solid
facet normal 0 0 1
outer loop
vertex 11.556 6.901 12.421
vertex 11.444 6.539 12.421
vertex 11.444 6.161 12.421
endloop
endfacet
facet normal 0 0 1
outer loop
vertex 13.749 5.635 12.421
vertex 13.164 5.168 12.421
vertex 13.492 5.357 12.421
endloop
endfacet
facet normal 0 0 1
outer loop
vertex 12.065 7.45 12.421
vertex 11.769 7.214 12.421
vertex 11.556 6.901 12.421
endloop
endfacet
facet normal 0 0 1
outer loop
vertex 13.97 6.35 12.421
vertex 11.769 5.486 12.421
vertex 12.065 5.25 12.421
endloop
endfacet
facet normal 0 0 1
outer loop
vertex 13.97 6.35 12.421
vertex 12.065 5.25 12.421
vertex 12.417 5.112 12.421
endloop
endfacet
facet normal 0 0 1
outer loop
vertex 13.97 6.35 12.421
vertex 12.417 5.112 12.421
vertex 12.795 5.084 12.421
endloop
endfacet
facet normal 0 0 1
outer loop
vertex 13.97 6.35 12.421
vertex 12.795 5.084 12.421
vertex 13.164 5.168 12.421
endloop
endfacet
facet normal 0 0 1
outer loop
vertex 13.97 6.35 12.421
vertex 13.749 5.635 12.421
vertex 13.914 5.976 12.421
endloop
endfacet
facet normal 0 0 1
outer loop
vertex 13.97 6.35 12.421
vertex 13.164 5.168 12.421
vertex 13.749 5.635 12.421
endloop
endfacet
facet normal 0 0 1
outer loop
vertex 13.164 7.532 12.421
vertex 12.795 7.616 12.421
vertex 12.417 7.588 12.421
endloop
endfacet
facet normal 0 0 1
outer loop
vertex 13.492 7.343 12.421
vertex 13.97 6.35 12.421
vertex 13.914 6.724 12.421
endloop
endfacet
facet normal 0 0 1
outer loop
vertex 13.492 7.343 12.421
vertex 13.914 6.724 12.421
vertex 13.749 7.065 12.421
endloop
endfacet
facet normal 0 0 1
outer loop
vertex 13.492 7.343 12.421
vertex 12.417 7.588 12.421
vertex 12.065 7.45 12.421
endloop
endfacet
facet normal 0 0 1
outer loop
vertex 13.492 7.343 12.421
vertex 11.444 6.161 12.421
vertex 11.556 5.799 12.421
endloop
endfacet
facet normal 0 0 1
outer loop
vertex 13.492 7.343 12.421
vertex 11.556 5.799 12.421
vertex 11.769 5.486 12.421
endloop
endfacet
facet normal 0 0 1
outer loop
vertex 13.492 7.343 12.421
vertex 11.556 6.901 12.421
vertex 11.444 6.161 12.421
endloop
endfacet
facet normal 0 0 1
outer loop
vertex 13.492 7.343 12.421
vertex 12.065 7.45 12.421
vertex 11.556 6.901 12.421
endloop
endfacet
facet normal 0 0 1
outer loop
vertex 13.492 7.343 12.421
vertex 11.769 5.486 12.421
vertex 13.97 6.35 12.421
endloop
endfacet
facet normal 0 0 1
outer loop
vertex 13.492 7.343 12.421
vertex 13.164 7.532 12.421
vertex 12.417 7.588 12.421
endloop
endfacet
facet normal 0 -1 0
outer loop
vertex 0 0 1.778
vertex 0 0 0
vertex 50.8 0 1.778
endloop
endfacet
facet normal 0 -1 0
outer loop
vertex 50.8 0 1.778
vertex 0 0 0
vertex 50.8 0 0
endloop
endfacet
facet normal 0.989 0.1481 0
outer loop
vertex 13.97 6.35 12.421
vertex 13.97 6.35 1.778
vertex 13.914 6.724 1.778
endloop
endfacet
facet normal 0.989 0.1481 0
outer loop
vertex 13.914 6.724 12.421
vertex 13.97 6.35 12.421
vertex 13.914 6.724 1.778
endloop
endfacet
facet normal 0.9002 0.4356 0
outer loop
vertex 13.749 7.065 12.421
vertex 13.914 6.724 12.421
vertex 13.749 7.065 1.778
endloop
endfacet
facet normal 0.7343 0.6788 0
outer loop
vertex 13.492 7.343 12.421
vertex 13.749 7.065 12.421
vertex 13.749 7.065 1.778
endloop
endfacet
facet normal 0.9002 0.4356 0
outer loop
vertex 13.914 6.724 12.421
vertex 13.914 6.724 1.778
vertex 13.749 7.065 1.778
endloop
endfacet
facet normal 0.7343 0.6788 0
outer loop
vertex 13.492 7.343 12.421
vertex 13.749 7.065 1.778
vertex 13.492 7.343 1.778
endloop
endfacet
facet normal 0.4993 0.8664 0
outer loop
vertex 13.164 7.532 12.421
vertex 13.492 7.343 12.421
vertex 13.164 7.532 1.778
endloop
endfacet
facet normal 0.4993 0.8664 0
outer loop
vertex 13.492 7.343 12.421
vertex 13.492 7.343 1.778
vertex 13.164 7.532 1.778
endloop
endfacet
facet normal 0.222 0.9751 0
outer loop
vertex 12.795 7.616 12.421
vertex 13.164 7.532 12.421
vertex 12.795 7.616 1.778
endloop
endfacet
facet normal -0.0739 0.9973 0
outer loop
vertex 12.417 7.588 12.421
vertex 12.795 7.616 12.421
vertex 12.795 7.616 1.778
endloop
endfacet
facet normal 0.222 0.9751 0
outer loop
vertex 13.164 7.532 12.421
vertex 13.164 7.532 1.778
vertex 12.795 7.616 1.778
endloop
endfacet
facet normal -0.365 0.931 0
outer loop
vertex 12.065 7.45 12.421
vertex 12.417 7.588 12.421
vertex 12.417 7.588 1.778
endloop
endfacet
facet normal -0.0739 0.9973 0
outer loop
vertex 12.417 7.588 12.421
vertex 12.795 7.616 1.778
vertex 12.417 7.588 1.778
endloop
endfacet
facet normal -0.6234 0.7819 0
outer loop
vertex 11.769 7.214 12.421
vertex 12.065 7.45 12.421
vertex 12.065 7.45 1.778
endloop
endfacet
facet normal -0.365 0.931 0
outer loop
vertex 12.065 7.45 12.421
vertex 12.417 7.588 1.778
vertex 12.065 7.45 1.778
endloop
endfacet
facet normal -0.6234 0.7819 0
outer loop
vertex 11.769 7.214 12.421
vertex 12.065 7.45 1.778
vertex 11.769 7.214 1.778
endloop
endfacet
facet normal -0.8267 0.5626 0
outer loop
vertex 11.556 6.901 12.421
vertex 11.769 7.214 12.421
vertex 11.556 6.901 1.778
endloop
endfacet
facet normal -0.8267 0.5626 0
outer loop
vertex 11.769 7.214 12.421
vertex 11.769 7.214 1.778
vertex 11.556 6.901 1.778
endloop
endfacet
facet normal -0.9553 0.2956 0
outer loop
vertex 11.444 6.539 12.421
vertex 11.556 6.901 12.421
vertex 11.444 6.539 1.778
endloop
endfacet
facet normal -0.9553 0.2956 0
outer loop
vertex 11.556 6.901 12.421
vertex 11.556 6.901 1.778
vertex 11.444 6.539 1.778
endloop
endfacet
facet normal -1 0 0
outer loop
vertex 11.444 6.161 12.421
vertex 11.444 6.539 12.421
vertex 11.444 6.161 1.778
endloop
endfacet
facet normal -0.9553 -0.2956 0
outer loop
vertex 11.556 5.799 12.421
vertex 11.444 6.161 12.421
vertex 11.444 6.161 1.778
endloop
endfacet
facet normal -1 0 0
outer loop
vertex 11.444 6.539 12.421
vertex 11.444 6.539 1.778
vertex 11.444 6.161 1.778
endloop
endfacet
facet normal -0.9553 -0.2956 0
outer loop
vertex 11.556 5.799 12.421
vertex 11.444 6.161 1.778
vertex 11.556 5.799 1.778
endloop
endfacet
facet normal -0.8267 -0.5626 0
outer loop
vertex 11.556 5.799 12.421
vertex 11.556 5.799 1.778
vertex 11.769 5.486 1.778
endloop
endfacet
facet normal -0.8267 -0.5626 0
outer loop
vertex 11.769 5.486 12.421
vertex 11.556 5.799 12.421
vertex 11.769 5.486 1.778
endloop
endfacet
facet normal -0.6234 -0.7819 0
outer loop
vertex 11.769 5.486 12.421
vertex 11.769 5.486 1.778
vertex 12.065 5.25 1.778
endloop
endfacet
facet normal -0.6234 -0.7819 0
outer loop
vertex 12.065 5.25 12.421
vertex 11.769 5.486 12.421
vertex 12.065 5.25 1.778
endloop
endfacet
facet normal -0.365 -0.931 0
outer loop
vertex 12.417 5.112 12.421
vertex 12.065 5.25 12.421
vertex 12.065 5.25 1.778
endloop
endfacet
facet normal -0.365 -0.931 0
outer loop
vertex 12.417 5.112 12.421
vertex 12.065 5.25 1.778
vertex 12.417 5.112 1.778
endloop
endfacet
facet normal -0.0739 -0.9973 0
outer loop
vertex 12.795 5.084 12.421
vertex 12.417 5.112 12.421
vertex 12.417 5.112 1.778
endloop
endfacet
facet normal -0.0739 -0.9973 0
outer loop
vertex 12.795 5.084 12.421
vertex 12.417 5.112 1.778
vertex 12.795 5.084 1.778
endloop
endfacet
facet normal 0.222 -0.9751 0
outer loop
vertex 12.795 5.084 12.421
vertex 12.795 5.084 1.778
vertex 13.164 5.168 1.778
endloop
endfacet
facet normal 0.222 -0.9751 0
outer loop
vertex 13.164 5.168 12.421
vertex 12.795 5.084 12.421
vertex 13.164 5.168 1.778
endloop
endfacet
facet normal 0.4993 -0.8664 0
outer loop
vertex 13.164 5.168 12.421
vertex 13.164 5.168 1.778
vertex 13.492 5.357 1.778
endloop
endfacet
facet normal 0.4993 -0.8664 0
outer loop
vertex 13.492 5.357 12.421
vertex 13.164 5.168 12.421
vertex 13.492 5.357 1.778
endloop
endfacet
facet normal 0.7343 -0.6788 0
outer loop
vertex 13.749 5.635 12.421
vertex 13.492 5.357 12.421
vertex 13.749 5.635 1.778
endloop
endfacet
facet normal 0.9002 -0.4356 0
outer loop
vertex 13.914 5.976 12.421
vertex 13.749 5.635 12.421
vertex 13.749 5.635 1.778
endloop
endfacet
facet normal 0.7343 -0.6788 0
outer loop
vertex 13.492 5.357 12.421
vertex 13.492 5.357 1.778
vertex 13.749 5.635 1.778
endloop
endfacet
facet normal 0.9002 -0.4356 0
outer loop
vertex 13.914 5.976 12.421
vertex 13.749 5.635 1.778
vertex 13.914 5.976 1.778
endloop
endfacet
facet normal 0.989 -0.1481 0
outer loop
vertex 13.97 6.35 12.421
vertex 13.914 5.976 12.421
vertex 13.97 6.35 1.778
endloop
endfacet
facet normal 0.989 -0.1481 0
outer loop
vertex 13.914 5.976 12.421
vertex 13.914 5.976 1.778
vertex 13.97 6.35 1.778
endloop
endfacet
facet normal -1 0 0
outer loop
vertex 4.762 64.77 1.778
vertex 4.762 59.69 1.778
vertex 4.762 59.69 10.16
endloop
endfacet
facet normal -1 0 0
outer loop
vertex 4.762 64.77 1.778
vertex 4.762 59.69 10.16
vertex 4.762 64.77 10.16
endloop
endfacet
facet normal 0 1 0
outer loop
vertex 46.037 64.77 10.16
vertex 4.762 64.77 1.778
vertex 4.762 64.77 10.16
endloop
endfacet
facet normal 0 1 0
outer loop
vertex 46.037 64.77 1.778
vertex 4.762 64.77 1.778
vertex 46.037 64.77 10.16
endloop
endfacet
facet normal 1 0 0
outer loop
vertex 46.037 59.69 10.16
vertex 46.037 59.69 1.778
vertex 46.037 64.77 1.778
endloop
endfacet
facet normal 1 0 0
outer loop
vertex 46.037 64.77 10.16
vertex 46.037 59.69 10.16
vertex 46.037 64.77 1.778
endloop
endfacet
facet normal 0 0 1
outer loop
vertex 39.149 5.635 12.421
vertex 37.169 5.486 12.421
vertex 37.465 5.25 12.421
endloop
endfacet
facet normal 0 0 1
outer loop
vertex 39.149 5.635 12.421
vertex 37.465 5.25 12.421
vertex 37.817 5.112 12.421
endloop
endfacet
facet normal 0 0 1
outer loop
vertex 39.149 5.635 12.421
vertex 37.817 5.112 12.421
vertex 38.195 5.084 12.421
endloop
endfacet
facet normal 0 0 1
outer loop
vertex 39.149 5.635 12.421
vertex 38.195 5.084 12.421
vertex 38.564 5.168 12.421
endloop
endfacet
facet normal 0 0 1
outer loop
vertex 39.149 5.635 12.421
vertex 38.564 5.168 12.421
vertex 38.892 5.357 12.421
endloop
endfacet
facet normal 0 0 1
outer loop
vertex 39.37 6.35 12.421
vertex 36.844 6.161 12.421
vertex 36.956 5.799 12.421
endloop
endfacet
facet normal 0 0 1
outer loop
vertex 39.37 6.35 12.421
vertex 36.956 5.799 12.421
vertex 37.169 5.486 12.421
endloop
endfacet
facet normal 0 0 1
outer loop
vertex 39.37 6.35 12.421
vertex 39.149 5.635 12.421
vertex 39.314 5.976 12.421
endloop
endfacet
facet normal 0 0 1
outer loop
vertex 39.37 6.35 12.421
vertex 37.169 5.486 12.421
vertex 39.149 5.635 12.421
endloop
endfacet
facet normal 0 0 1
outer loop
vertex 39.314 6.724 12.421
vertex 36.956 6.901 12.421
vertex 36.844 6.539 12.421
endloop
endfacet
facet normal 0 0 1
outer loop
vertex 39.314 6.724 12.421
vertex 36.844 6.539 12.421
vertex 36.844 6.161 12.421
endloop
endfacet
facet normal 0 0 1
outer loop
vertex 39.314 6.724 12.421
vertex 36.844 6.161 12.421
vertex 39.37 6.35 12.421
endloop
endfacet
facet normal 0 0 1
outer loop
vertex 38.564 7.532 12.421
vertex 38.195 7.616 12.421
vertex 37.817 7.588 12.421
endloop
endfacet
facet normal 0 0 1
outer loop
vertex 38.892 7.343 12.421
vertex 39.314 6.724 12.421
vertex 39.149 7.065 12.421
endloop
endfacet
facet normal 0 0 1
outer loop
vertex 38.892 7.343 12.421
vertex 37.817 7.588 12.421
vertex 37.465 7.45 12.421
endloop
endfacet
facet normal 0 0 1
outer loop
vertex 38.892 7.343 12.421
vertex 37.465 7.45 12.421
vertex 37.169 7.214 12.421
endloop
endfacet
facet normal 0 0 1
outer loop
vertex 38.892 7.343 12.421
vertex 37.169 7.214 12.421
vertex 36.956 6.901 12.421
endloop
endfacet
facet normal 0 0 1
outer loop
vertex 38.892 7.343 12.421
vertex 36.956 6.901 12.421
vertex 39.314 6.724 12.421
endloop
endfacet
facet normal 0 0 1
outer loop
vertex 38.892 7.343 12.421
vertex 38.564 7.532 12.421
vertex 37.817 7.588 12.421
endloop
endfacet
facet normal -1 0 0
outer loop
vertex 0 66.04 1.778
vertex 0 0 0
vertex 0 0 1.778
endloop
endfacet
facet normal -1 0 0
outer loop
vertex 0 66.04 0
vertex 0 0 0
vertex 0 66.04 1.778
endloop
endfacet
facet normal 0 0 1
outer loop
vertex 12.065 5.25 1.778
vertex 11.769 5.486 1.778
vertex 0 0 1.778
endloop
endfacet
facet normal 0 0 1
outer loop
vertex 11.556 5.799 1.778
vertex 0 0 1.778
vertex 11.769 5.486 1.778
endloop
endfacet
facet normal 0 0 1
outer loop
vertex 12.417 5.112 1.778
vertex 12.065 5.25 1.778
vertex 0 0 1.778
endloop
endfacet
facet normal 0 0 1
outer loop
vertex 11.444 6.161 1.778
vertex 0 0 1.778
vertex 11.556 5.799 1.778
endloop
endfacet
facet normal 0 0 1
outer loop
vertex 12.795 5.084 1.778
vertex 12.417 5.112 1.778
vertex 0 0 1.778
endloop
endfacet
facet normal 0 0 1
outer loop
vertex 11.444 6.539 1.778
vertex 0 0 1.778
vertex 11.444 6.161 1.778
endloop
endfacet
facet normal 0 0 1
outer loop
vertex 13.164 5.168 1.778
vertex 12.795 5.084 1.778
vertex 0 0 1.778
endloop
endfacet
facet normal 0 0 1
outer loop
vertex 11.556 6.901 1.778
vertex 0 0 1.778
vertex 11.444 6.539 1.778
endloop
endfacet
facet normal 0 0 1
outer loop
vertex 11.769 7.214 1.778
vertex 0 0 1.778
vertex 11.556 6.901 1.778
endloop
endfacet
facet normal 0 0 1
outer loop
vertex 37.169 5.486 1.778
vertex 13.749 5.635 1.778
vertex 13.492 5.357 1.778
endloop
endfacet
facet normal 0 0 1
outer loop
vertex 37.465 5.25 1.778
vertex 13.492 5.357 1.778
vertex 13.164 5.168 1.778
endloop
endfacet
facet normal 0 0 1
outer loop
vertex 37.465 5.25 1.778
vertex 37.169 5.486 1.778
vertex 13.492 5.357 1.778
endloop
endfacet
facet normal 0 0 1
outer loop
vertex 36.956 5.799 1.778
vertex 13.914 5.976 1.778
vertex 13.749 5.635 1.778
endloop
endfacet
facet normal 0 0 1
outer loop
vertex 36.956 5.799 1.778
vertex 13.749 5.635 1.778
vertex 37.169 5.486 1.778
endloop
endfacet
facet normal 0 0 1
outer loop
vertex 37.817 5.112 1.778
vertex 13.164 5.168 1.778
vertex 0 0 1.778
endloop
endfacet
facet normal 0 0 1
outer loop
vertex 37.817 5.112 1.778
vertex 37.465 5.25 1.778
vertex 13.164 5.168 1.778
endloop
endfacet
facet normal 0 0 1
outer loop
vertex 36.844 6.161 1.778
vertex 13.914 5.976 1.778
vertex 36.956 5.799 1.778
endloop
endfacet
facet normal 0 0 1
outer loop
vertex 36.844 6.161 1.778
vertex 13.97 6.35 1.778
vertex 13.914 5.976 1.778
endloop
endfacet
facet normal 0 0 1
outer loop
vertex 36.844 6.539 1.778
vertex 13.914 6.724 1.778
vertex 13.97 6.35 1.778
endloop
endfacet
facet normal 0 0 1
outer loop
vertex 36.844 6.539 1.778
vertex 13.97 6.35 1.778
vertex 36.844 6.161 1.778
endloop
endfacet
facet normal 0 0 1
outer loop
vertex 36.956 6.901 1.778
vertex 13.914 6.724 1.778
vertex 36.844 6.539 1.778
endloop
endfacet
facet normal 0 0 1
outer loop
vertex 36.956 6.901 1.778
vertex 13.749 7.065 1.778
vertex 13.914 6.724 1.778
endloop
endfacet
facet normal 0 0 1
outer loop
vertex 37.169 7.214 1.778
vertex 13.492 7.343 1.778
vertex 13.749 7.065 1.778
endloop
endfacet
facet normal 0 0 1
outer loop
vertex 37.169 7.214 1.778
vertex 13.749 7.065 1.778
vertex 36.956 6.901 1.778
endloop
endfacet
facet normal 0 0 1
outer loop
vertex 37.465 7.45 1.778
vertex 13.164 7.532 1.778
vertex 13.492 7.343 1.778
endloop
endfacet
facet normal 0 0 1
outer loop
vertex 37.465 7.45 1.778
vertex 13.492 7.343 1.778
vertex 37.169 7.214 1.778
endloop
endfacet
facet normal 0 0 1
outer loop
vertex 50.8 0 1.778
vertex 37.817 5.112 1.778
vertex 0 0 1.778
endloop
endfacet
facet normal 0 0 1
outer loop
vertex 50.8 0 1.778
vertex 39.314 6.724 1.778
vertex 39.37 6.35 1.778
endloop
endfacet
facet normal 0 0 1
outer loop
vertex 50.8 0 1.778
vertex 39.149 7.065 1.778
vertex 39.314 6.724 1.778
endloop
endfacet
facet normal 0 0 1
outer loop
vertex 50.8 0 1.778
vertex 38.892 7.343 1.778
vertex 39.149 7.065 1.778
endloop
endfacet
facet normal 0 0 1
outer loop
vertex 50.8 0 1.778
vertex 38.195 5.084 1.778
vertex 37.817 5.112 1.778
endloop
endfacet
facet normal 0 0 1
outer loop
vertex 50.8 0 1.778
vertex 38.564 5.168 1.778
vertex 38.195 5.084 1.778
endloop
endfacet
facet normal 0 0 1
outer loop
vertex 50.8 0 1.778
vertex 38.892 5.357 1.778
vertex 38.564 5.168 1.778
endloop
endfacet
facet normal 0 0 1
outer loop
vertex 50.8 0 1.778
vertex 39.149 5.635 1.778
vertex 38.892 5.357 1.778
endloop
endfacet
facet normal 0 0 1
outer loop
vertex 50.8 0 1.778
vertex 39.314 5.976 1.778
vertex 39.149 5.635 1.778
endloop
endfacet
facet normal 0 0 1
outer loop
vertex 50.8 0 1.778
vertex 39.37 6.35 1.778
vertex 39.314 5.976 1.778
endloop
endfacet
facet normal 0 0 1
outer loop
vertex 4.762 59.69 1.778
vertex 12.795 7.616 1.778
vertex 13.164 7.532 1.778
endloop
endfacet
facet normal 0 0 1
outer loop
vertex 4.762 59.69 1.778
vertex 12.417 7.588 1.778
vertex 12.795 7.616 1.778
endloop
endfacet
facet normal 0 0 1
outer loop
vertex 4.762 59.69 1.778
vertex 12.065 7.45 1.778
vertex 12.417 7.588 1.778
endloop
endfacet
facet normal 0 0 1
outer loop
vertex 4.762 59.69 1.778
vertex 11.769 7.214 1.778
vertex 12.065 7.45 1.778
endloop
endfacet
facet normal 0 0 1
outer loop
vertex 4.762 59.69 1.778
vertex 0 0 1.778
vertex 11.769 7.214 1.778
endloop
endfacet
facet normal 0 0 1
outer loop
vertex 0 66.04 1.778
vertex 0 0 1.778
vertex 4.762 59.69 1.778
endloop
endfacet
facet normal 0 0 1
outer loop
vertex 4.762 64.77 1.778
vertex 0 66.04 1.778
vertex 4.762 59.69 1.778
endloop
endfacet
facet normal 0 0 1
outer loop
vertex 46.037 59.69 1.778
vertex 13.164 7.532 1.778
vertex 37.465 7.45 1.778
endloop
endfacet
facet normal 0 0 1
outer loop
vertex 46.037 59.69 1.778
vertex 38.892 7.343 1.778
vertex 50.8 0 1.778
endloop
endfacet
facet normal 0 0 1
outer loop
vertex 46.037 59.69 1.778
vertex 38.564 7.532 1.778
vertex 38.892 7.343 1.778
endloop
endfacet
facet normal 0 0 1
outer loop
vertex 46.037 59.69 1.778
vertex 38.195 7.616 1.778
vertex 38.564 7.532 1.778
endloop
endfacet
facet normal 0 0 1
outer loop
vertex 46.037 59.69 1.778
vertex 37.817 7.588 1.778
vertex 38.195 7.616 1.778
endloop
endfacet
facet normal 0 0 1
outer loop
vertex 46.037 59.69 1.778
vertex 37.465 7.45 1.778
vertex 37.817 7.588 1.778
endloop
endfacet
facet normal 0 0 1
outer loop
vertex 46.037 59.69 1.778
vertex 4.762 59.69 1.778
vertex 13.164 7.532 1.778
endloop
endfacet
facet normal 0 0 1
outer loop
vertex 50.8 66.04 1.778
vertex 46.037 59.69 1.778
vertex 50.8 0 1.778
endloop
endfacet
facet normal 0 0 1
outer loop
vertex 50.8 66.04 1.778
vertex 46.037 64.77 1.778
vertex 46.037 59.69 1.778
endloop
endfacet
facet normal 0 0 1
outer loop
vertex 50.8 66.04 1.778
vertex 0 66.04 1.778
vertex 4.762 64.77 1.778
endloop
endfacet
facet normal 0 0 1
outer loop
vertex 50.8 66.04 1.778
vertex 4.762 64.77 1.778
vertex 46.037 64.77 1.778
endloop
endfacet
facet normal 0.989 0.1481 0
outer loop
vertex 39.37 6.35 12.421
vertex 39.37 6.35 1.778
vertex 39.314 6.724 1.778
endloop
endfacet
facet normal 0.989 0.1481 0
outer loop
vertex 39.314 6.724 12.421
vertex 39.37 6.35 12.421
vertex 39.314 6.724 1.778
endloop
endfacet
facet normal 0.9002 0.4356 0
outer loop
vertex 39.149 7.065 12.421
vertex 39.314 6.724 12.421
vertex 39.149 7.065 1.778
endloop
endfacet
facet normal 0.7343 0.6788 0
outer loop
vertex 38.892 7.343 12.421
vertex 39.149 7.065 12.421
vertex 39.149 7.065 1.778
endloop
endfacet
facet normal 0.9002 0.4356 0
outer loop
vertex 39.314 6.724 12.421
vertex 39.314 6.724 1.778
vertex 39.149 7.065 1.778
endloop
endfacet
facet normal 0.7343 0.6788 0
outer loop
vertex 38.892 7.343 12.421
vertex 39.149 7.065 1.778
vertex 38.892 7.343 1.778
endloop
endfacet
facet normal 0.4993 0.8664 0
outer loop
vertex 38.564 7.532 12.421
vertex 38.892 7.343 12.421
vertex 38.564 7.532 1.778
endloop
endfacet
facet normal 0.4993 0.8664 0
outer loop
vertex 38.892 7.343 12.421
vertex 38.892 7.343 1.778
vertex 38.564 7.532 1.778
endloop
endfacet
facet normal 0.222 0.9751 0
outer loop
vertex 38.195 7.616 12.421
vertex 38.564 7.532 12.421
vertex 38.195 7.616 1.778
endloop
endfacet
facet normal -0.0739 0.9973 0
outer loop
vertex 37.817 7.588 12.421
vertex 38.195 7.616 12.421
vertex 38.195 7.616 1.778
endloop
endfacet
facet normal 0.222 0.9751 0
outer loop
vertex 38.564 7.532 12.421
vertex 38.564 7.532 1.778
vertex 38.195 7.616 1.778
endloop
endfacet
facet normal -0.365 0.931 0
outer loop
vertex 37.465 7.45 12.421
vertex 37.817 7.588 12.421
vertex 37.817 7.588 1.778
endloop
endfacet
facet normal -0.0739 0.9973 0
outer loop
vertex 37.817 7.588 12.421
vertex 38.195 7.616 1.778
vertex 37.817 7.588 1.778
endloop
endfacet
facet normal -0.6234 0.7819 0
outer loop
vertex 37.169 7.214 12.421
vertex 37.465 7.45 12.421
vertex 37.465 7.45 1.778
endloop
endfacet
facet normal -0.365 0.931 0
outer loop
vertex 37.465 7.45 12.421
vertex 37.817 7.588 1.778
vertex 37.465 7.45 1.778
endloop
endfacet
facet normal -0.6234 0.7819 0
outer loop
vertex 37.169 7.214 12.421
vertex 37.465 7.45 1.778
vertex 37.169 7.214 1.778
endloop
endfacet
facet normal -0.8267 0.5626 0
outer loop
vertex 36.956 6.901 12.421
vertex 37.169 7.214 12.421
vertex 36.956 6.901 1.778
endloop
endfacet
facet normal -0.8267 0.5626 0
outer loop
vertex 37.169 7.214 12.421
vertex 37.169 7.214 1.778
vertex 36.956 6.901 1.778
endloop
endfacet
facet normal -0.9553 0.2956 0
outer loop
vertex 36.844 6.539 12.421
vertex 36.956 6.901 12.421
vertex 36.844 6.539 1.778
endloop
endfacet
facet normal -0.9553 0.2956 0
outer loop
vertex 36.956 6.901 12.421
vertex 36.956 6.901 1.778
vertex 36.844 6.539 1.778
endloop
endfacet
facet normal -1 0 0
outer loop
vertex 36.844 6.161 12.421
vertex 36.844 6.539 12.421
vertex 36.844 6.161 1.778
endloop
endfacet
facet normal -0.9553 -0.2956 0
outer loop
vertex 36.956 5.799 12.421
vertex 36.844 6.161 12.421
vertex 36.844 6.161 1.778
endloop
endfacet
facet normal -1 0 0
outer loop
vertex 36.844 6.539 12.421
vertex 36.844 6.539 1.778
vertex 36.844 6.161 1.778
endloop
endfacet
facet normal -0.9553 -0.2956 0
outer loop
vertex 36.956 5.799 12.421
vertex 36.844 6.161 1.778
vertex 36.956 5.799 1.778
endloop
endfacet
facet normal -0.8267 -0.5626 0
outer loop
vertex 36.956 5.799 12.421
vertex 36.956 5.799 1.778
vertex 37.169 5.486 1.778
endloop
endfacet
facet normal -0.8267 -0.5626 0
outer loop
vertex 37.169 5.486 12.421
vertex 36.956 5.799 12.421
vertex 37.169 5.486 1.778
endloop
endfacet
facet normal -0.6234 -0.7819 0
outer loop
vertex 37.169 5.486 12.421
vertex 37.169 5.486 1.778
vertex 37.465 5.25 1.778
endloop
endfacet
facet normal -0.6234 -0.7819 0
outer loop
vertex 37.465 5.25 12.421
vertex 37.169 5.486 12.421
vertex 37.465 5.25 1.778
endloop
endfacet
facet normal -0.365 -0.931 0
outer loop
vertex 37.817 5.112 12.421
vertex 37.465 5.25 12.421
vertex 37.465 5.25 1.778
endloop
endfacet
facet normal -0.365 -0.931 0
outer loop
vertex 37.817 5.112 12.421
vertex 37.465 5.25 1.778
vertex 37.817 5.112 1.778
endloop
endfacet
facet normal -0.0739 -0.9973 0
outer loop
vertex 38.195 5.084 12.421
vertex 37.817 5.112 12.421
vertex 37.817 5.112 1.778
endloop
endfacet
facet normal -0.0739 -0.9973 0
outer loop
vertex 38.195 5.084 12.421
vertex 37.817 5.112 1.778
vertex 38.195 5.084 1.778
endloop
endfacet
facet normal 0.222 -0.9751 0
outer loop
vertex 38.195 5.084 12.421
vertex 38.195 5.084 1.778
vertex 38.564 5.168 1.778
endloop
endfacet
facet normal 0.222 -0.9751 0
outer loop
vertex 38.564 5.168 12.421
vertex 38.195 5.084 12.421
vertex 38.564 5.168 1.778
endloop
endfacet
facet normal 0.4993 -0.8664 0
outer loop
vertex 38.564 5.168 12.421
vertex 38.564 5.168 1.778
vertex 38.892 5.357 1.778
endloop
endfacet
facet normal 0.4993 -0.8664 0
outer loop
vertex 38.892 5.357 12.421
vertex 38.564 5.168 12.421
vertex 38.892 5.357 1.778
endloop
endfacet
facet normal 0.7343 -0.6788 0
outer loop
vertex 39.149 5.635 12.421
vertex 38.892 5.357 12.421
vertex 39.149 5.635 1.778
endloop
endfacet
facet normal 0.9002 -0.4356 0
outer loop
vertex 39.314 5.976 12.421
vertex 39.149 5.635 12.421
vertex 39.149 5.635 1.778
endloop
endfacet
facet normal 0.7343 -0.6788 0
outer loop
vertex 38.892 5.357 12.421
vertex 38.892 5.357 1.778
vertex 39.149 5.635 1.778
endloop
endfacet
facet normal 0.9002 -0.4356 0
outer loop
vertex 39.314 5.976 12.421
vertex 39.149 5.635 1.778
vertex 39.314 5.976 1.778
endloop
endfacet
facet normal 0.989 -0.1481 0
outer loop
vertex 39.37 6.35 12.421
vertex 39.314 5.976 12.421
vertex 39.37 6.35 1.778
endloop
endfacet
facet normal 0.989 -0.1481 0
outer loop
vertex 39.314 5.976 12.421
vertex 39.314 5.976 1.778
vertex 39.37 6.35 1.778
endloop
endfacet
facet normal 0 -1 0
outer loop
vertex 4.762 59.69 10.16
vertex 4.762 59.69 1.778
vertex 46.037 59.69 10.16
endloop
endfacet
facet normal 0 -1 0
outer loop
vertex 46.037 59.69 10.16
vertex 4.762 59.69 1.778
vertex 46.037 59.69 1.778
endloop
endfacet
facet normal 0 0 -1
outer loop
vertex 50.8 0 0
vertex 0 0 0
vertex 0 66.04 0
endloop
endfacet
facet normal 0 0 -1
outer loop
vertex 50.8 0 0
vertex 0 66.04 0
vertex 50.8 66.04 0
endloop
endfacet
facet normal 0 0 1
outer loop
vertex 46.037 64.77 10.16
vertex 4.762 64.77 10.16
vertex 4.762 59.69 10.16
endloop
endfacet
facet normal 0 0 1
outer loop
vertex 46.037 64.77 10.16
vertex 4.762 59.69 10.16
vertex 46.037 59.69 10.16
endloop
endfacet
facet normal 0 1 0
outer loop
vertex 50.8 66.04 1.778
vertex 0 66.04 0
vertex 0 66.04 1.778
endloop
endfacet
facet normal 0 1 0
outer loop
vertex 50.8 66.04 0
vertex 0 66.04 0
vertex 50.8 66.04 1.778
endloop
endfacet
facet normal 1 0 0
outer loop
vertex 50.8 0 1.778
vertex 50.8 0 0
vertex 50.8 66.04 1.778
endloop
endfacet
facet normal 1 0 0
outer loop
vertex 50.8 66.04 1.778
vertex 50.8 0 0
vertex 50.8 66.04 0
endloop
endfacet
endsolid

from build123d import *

# Parameters (mm, degrees)
SKETCH1_W           = 50.8
SKETCH1_H           = 66.04
BOSS_EXTRUDE1_DEPTH = 1.778
SKETCH2_W           = 41.275
SKETCH2_H           = 5.08
BOSS_EXTRUDE2_DEPTH = 8.382
SKETCH3_R           = 1.27
BOSS_EXTRUDE3_DEPTH = 10.6426


with BuildPart() as part:
    # Sketch1 → Boss-Extrude1 (new body)
    with BuildSketch(Plane.XY):
        with Locations((25.4, 33.02)):
            Rectangle(SKETCH1_W, SKETCH1_H)
    extrude(amount=BOSS_EXTRUDE1_DEPTH)

    # Sketch2 → Boss-Extrude2 (add)
    with BuildSketch(Plane.XY.offset(1.778)):
        with Locations((25.4, 62.23)):
            Rectangle(SKETCH2_W, SKETCH2_H)
    extrude(amount=BOSS_EXTRUDE2_DEPTH)

    # Sketch3 → Boss-Extrude3 (add)
    with BuildSketch(Plane.XY.offset(1.778)):
        with Locations((12.7, 6.35)):
            Circle(SKETCH3_R)
        with Locations((38.1, 6.35)):
            Circle(SKETCH3_R)
    extrude(amount=BOSS_EXTRUDE3_DEPTH)


solid = part.part
